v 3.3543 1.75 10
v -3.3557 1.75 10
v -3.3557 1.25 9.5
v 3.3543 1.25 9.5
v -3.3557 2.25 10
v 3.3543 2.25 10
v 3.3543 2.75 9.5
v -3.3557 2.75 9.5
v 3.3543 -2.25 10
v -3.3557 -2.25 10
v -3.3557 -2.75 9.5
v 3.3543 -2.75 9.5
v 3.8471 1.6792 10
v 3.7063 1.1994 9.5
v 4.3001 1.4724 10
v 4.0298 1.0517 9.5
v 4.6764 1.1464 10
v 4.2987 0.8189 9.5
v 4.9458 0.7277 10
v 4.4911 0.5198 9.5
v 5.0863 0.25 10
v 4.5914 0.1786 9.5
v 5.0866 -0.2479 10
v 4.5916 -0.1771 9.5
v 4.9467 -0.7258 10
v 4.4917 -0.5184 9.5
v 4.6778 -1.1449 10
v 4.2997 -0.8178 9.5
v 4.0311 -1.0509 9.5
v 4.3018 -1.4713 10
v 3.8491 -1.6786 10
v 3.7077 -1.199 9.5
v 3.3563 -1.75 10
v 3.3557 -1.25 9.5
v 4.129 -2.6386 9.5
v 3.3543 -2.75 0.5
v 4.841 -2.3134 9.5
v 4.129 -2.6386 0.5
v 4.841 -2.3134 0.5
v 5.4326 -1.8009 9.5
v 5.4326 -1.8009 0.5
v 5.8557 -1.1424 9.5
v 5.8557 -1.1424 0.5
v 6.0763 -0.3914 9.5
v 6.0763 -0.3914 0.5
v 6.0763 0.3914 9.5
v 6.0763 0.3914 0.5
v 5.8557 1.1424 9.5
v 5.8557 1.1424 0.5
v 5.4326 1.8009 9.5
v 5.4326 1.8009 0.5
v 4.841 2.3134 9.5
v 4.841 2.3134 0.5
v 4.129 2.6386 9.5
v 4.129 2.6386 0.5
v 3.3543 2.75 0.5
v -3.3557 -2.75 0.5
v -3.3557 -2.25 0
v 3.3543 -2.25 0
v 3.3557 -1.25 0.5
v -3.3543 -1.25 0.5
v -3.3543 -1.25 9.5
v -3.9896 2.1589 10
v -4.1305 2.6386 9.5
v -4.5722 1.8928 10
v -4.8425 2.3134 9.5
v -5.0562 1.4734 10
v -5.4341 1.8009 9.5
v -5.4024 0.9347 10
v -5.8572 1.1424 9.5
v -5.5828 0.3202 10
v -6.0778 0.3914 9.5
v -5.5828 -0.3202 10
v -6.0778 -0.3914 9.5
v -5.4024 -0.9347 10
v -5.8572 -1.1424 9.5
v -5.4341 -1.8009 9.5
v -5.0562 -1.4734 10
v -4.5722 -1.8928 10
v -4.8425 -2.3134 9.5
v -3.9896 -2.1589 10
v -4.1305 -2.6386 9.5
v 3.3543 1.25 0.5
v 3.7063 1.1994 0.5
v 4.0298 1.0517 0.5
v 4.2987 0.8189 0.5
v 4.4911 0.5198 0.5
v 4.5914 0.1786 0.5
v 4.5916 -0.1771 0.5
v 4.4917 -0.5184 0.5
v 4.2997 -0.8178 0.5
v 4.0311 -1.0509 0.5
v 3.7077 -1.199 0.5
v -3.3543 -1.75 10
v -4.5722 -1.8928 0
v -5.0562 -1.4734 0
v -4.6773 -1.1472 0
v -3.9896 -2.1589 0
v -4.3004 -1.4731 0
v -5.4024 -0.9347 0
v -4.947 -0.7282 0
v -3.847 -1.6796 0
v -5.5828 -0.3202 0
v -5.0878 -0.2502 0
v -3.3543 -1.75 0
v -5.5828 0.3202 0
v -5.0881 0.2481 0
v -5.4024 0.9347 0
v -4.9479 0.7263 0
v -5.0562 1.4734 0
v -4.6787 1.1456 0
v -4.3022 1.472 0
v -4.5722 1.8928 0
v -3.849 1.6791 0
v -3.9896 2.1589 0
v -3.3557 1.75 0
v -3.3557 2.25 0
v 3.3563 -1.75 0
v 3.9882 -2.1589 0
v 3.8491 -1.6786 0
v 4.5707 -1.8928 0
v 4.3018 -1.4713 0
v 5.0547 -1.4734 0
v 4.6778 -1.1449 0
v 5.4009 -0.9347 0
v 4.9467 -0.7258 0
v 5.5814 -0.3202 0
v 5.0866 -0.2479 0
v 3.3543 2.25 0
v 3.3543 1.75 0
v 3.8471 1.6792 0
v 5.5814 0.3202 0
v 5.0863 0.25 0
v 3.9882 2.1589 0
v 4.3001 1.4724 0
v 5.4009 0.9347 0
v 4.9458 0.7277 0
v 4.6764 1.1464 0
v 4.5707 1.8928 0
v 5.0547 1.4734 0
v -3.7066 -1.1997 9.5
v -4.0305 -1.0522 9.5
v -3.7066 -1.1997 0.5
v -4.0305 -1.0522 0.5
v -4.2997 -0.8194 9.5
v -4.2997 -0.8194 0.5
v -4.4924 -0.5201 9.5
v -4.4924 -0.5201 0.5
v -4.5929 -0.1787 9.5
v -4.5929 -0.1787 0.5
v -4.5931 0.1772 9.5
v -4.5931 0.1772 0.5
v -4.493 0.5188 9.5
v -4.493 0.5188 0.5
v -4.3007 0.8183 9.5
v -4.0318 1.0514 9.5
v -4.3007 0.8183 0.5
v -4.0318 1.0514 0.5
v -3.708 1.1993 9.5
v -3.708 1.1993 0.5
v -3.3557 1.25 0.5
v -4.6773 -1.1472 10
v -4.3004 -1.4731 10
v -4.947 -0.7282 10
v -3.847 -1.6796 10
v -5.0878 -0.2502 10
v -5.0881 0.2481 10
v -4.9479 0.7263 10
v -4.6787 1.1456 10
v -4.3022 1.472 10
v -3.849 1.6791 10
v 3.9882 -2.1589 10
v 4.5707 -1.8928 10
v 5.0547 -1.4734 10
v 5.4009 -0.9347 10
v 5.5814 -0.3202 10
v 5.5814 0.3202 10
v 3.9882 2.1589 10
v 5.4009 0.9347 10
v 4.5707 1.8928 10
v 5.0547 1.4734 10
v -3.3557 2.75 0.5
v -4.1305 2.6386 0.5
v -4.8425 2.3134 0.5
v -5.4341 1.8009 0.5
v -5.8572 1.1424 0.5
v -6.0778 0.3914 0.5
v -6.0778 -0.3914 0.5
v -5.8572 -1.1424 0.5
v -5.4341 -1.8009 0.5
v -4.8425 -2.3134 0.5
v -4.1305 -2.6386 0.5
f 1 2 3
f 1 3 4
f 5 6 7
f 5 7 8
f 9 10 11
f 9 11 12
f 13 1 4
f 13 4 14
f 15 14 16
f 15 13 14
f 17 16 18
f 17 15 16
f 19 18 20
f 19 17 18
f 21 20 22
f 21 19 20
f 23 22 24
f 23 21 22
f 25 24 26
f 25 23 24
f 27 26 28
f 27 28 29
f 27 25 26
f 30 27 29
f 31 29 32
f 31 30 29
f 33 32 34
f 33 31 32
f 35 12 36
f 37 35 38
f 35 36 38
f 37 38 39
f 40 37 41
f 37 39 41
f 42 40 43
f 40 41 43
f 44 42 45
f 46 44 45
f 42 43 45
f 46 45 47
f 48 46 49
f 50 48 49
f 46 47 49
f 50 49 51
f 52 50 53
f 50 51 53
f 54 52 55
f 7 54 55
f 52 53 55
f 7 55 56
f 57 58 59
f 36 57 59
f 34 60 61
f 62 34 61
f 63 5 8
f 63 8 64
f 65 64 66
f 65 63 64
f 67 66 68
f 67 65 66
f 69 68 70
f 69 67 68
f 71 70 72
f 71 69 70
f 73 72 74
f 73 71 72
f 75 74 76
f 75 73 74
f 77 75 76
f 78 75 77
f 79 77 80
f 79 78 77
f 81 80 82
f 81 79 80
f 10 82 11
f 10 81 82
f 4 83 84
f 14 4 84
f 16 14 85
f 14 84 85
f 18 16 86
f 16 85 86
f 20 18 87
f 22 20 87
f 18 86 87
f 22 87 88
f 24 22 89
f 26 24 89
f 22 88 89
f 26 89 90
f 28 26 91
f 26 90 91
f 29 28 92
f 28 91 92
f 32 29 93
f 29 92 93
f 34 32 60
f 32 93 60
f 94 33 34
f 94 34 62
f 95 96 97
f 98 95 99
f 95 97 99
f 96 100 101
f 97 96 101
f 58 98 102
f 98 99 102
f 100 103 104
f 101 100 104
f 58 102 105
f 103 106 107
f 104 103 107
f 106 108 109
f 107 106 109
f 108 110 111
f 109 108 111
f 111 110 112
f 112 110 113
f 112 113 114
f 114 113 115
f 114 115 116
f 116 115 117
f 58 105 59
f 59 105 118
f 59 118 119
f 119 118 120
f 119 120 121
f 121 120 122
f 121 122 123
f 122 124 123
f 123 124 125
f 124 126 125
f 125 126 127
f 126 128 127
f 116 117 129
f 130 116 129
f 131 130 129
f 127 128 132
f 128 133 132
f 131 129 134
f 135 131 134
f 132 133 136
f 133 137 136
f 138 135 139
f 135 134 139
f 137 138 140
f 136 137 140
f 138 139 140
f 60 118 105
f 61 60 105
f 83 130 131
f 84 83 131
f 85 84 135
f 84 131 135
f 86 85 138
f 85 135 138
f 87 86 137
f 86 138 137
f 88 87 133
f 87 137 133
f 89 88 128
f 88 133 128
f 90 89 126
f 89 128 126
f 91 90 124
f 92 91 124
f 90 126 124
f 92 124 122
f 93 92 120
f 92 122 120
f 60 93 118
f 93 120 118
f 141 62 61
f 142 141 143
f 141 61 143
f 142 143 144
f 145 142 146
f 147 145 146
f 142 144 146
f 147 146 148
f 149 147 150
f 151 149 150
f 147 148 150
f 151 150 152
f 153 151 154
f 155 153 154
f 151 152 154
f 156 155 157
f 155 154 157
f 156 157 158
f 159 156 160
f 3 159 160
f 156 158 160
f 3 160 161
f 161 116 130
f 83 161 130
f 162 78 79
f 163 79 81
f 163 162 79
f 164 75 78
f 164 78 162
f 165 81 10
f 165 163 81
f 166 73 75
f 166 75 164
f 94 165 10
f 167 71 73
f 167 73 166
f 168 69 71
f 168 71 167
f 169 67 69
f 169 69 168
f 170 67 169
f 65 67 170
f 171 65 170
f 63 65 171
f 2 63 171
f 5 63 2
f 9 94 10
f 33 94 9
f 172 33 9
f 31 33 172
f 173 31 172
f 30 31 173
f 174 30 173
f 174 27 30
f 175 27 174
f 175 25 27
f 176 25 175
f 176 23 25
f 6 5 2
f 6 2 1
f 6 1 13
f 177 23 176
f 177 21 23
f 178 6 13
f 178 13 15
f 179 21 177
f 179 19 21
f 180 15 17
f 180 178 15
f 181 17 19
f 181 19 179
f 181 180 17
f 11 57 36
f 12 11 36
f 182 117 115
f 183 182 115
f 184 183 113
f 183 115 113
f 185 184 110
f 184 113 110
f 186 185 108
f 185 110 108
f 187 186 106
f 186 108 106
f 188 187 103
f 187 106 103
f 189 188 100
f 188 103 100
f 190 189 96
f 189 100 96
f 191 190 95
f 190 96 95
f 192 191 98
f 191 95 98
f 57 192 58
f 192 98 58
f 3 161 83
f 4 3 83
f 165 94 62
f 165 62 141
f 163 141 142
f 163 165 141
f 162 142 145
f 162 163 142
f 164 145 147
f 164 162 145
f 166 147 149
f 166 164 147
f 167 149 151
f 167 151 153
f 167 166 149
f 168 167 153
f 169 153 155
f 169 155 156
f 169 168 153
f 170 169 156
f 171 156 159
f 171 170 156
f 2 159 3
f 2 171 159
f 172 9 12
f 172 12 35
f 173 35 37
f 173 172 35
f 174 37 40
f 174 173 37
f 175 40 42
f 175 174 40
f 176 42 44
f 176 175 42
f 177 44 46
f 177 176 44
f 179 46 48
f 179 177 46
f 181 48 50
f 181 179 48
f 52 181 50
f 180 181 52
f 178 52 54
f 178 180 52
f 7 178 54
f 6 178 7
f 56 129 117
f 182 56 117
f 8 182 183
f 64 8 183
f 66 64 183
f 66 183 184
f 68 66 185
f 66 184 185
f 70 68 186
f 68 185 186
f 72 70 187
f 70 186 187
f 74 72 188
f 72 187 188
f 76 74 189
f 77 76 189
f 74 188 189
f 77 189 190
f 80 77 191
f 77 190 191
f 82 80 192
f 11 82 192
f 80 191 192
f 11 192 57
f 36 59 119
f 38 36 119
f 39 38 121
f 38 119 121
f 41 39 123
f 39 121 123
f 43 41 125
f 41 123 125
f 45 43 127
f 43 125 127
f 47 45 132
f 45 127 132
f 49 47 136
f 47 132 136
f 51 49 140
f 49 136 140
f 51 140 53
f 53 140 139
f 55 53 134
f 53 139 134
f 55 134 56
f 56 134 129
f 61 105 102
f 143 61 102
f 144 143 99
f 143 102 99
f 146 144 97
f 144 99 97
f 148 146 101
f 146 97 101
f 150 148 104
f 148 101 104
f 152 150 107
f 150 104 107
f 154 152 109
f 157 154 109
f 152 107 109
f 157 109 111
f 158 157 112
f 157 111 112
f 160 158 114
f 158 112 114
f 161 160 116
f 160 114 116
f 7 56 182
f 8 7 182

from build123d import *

# Parameters (mm, degrees)
F1_DEPTH = 10
F2_SIZE  = 0.5


# Not quite as in the source:
# - ends of sketch curves that miss each other by under 0.0002 mm in the source are joined


with BuildPart() as f1:
    # F0 (on Top) → F1 (new body)
    with BuildSketch(Plane.XY):
        with BuildLine():
            Line((3.3542521534, 2.75), (-3.3557469528, 2.75))
            ThreePointArc((-3.3557469528, 2.75), (-6.1057473997, -4.469e-07), (-3.3557469528, -2.7500008938))
            Line((-3.3557469528, -2.7500008938), (3.3542521534, -2.75))
            ThreePointArc((3.3542521534, -2.75), (6.1042526003, -4.469e-07), (3.3542521534, 2.75))
        make_face()
        with BuildLine():
            Line((-3.3557469528, 1.25), (3.3542521534, 1.25))
            ThreePointArc((3.3542521534, 1.25), (4.6042523768, 0.000746953), (3.3557469528, -1.25))
            Line((3.3557469528, -1.25), (-3.3542521534, -1.25))
            ThreePointArc((-3.3542521534, -1.25), (-4.6057471763, -0.0007478467), (-3.3557469528, 1.25))
        make_face(mode=Mode.SUBTRACT)
    extrude(amount=F1_DEPTH)

    # F2
    f2_edges = [f1.edges().sort_by_distance(p)[0] for p in [
        (-0.000747, -2.75, 10),
        (6.104253, 0, 10),
        (-0.000747, 2.75, 10),
        (-6.105747, 0, 10),
        (-0.000747, 1.25, 10),
        (4.604252, 0.000747, 10),
        (0.000747, -1.25, 10),
        (-4.605747, -0.000748, 10),
        (-0.000747, -2.75, 0),
        (6.104253, 0, 0),
        (-0.000747, 2.75, 0),
        (-6.105747, 0, 0),
        (-0.000747, 1.25, 0),
        (4.604252, 0.000747, 0),
        (0.000747, -1.25, 0),
        (-4.605747, -0.000748, 0),
    ]]
    chamfer(f2_edges, length=F2_SIZE)


solid = f1.part
